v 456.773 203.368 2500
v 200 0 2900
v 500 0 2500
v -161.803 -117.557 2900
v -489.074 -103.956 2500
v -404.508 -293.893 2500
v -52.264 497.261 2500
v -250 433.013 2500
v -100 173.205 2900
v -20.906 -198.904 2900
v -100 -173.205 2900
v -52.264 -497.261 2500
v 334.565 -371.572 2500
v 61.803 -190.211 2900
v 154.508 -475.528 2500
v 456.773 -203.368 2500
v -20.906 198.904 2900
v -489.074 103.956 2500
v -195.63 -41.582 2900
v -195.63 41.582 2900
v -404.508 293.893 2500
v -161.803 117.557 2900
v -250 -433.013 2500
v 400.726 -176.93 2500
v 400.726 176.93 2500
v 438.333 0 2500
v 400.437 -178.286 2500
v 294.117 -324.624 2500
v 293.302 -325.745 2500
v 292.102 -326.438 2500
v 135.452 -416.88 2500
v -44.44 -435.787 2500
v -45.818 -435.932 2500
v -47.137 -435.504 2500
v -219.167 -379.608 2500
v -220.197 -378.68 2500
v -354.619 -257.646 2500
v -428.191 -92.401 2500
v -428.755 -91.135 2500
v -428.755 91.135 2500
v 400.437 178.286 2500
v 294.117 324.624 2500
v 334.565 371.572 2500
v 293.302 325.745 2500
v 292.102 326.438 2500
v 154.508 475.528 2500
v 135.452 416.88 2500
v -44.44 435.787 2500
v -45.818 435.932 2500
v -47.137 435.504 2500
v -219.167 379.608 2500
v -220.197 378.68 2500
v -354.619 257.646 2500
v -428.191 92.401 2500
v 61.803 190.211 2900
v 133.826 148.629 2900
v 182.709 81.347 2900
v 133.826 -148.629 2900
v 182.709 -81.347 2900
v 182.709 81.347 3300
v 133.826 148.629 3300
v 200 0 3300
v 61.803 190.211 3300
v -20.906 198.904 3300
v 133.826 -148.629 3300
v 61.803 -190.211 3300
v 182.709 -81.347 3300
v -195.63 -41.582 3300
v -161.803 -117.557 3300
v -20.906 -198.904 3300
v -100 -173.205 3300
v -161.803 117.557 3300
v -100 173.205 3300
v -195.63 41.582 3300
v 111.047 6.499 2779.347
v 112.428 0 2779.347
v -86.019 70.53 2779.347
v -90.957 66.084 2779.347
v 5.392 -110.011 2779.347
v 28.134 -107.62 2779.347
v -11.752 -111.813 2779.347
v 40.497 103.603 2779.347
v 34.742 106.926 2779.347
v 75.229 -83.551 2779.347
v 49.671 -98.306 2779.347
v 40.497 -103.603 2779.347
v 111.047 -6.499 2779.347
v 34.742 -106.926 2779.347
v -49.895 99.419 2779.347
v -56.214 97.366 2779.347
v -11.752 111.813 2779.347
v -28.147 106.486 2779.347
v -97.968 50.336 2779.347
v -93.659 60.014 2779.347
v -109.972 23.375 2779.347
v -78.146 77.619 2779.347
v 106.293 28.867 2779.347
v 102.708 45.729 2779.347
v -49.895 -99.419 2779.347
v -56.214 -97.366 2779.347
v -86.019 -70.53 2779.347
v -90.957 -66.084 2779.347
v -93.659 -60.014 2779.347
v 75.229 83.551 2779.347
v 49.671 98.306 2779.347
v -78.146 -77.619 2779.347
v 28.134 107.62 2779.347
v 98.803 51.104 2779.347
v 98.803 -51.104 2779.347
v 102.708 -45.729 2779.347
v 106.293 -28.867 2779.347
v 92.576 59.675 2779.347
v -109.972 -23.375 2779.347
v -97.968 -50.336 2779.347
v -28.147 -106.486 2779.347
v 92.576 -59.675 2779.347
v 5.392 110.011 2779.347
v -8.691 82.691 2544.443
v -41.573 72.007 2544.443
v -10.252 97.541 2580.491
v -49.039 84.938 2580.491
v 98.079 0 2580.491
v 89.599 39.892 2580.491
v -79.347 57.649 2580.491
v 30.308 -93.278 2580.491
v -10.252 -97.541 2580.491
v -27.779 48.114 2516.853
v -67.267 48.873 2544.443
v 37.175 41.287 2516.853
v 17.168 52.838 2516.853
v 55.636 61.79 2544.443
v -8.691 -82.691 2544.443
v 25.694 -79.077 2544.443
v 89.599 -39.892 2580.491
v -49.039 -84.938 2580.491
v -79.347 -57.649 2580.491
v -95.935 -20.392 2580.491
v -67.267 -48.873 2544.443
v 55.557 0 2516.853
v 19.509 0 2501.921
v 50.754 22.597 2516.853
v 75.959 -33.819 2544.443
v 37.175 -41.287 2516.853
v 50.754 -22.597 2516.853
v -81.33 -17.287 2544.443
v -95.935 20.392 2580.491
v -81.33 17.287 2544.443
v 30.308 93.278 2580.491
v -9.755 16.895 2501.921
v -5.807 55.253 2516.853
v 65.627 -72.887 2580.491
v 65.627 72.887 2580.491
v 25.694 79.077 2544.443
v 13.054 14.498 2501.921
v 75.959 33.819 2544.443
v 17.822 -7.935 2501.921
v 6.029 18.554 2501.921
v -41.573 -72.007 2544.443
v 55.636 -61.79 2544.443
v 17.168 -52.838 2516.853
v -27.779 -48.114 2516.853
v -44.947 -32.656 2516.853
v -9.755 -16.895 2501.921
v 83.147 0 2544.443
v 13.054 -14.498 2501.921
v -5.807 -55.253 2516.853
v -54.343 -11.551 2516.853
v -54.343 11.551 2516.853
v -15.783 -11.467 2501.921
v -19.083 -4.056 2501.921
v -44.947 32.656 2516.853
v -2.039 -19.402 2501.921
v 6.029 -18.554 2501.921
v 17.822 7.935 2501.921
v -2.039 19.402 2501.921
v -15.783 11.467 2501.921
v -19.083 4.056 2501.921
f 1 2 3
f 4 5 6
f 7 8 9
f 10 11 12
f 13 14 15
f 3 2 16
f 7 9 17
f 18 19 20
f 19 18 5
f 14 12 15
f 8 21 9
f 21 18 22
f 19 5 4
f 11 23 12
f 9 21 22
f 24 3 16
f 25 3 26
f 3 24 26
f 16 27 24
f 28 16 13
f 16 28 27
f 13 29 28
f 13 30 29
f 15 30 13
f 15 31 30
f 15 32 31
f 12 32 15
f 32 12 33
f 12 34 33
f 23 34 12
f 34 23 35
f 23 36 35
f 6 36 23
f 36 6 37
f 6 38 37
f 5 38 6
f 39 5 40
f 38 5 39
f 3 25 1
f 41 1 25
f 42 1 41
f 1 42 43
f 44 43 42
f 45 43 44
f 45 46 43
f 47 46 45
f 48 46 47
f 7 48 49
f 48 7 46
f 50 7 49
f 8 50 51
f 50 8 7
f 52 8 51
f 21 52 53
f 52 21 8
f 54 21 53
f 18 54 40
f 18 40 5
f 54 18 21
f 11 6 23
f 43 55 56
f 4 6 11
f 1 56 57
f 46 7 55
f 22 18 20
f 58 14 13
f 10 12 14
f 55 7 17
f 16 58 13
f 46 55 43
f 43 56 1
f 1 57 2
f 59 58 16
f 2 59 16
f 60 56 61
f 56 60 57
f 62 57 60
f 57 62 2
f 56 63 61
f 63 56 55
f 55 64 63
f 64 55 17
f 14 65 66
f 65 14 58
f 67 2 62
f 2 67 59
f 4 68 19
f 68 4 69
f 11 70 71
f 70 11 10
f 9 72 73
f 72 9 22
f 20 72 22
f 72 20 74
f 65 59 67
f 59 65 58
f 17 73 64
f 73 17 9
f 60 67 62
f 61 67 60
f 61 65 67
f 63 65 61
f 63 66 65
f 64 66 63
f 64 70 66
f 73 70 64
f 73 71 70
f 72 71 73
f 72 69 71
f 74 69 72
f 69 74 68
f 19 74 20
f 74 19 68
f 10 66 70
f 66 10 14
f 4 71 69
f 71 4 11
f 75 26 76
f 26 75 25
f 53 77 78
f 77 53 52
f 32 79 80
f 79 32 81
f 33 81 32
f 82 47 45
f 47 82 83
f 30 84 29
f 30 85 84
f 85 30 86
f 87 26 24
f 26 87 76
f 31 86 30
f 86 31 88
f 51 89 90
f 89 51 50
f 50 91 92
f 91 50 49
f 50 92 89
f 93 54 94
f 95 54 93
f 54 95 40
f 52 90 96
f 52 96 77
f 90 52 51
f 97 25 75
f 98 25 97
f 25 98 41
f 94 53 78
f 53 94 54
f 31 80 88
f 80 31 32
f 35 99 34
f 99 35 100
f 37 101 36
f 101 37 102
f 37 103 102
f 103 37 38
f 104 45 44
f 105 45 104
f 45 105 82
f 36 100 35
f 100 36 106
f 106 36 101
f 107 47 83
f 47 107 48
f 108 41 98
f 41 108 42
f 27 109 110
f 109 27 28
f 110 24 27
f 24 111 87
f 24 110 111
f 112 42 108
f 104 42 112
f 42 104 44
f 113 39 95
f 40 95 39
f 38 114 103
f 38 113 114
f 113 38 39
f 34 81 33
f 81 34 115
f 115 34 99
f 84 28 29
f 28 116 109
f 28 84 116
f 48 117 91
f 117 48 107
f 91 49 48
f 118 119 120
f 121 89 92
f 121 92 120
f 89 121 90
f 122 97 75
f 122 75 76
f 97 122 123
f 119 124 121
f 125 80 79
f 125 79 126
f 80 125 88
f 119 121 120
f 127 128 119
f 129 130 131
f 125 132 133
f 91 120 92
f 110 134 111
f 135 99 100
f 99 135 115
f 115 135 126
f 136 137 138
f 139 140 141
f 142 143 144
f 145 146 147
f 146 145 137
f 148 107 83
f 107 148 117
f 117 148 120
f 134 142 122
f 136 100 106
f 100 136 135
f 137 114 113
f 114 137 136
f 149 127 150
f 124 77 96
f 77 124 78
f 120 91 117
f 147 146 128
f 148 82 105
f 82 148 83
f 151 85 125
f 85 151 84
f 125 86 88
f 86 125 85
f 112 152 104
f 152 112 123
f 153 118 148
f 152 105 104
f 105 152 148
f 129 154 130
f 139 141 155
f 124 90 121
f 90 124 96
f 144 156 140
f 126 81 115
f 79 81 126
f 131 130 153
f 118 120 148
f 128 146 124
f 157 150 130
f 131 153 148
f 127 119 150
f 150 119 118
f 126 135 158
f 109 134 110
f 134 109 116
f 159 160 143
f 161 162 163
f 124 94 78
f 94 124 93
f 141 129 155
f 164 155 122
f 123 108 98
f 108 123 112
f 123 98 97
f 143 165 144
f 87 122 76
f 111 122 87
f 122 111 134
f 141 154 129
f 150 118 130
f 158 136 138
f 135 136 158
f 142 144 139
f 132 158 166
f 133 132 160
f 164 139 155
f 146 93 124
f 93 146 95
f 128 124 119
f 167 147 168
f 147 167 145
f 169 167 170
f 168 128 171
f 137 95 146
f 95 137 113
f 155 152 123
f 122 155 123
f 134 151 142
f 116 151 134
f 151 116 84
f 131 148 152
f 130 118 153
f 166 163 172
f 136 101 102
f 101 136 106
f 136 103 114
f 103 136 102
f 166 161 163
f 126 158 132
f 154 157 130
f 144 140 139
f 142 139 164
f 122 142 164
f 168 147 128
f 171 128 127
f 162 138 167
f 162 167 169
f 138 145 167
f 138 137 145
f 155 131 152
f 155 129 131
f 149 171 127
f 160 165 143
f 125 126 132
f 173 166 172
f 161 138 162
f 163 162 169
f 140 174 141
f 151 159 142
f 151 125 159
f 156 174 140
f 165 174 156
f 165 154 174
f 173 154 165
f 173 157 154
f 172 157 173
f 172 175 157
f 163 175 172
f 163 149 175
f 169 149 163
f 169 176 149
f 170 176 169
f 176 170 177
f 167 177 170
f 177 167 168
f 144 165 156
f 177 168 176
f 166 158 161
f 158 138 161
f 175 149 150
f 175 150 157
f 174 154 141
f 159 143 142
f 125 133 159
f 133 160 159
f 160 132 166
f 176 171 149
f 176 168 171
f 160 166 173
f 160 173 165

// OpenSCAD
a=15;

module un(){
    cylinder(40,50,20,$fn=a);
    translate([0,0,40])cylinder(40,20,20,$fn=a);
}

module deux(){

    difference(){
        un();
        translate([0,0,-1])cylinder(30,45,10,$fn=a); 
    }

    translate([])hull(){

    translate([0,0,10])sphere(10,$fn=a);
        translate([0,0,40])cylinder(40,10,15,$fn=a);
    }

}

translate([0,0,2500])scale([10,10,10])deux();
